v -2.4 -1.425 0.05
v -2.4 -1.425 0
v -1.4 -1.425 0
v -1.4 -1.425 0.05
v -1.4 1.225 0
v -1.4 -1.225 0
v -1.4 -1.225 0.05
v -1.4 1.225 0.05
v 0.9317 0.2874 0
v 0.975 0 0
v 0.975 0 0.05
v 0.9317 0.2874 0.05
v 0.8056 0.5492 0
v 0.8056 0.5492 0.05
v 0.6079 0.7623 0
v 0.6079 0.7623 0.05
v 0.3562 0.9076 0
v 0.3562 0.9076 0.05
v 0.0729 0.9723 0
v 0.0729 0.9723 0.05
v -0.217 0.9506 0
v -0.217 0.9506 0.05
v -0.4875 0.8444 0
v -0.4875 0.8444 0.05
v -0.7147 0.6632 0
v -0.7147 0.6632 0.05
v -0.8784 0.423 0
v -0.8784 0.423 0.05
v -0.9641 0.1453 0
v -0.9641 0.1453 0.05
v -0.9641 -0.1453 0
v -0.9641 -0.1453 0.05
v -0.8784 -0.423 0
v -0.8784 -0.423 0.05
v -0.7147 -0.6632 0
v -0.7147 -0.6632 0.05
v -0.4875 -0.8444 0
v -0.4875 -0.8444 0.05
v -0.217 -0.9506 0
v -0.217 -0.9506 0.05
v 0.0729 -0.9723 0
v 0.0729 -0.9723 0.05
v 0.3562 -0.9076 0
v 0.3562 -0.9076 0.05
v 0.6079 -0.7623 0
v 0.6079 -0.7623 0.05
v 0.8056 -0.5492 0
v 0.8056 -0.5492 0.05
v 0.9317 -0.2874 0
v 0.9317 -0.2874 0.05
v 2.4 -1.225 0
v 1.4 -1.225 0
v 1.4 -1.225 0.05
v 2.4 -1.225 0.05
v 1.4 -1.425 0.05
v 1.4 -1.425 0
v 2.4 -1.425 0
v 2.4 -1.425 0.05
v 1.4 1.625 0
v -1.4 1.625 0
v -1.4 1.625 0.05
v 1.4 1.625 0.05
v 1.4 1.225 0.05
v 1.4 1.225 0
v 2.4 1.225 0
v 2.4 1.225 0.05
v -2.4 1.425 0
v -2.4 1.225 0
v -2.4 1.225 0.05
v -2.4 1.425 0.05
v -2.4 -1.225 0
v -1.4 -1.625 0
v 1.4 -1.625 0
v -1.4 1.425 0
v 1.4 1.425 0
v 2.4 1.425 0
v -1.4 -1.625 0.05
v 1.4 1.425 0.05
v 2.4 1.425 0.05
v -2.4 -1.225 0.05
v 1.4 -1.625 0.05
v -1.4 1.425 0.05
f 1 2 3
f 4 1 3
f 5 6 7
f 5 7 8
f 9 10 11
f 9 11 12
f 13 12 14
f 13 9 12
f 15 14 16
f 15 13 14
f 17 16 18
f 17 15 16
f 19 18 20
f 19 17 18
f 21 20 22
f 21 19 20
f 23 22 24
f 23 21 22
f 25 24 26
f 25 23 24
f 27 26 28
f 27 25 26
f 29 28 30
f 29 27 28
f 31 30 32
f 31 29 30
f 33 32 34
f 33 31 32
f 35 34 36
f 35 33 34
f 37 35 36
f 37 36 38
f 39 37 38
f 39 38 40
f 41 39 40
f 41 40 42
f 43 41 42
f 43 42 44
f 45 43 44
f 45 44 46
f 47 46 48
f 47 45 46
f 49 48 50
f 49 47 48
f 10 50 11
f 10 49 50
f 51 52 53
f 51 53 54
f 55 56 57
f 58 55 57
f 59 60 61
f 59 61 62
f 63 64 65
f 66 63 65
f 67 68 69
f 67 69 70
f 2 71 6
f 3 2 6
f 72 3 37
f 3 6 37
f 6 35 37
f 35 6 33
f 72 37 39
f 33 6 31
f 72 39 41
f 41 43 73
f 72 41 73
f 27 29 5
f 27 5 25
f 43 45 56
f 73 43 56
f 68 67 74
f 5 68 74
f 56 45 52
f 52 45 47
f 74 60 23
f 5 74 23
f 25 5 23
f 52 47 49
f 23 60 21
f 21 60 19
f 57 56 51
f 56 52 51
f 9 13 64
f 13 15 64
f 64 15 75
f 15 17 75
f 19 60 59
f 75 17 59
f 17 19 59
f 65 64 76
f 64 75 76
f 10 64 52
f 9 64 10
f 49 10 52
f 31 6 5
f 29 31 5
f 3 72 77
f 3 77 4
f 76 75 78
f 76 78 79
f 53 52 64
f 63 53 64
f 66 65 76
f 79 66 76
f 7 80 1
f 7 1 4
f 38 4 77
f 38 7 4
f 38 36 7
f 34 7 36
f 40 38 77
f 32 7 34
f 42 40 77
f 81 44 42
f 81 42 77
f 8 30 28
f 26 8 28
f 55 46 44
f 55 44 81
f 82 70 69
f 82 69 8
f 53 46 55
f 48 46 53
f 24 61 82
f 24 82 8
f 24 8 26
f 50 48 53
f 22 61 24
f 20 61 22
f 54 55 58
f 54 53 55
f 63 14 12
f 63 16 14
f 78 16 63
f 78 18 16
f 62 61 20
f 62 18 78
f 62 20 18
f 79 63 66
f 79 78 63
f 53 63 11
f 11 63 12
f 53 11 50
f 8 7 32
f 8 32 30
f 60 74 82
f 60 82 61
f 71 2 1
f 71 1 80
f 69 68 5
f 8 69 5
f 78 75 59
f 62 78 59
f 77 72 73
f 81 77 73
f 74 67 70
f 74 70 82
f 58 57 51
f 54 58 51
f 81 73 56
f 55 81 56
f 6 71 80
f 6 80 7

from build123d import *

# Parameters (mm, degrees)
SKETCH1_W           = 2.8
SKETCH1_H           = 3.25
SKETCH1_R           = 0.975
SKETCH1_W_2         = 1
SKETCH1_H_2         = 0.2
BOSS_EXTRUDE1_DEPTH = 0.05


with BuildPart() as part:
    # Sketch1 → Boss-Extrude1 (new body)
    # profile 1 of 5: a face of its own
    with BuildSketch(Plane.XY):
        Rectangle(SKETCH1_W, SKETCH1_H)
        Circle(SKETCH1_R, mode=Mode.SUBTRACT)
    # profile 2 of 5: a face of its own
    with BuildSketch(Plane.XY):
        with Locations((-1.9, -1.325)):
            Rectangle(SKETCH1_W_2, SKETCH1_H_2)
    # profile 3 of 5: a face of its own
    with BuildSketch(Plane.XY):
        with Locations((1.9, -1.325)):
            Rectangle(SKETCH1_W_2, SKETCH1_H_2)
    # profile 4 of 5: a face of its own
    with BuildSketch(Plane.XY):
        with Locations((1.9, 1.325)):
            Rectangle(SKETCH1_W_2, SKETCH1_H_2)
    # profile 5 of 5: a face of its own
    with BuildSketch(Plane.XY):
        with Locations((-1.9, 1.325)):
            Rectangle(SKETCH1_W_2, SKETCH1_H_2)
    extrude(amount=BOSS_EXTRUDE1_DEPTH)


solid = part.part
